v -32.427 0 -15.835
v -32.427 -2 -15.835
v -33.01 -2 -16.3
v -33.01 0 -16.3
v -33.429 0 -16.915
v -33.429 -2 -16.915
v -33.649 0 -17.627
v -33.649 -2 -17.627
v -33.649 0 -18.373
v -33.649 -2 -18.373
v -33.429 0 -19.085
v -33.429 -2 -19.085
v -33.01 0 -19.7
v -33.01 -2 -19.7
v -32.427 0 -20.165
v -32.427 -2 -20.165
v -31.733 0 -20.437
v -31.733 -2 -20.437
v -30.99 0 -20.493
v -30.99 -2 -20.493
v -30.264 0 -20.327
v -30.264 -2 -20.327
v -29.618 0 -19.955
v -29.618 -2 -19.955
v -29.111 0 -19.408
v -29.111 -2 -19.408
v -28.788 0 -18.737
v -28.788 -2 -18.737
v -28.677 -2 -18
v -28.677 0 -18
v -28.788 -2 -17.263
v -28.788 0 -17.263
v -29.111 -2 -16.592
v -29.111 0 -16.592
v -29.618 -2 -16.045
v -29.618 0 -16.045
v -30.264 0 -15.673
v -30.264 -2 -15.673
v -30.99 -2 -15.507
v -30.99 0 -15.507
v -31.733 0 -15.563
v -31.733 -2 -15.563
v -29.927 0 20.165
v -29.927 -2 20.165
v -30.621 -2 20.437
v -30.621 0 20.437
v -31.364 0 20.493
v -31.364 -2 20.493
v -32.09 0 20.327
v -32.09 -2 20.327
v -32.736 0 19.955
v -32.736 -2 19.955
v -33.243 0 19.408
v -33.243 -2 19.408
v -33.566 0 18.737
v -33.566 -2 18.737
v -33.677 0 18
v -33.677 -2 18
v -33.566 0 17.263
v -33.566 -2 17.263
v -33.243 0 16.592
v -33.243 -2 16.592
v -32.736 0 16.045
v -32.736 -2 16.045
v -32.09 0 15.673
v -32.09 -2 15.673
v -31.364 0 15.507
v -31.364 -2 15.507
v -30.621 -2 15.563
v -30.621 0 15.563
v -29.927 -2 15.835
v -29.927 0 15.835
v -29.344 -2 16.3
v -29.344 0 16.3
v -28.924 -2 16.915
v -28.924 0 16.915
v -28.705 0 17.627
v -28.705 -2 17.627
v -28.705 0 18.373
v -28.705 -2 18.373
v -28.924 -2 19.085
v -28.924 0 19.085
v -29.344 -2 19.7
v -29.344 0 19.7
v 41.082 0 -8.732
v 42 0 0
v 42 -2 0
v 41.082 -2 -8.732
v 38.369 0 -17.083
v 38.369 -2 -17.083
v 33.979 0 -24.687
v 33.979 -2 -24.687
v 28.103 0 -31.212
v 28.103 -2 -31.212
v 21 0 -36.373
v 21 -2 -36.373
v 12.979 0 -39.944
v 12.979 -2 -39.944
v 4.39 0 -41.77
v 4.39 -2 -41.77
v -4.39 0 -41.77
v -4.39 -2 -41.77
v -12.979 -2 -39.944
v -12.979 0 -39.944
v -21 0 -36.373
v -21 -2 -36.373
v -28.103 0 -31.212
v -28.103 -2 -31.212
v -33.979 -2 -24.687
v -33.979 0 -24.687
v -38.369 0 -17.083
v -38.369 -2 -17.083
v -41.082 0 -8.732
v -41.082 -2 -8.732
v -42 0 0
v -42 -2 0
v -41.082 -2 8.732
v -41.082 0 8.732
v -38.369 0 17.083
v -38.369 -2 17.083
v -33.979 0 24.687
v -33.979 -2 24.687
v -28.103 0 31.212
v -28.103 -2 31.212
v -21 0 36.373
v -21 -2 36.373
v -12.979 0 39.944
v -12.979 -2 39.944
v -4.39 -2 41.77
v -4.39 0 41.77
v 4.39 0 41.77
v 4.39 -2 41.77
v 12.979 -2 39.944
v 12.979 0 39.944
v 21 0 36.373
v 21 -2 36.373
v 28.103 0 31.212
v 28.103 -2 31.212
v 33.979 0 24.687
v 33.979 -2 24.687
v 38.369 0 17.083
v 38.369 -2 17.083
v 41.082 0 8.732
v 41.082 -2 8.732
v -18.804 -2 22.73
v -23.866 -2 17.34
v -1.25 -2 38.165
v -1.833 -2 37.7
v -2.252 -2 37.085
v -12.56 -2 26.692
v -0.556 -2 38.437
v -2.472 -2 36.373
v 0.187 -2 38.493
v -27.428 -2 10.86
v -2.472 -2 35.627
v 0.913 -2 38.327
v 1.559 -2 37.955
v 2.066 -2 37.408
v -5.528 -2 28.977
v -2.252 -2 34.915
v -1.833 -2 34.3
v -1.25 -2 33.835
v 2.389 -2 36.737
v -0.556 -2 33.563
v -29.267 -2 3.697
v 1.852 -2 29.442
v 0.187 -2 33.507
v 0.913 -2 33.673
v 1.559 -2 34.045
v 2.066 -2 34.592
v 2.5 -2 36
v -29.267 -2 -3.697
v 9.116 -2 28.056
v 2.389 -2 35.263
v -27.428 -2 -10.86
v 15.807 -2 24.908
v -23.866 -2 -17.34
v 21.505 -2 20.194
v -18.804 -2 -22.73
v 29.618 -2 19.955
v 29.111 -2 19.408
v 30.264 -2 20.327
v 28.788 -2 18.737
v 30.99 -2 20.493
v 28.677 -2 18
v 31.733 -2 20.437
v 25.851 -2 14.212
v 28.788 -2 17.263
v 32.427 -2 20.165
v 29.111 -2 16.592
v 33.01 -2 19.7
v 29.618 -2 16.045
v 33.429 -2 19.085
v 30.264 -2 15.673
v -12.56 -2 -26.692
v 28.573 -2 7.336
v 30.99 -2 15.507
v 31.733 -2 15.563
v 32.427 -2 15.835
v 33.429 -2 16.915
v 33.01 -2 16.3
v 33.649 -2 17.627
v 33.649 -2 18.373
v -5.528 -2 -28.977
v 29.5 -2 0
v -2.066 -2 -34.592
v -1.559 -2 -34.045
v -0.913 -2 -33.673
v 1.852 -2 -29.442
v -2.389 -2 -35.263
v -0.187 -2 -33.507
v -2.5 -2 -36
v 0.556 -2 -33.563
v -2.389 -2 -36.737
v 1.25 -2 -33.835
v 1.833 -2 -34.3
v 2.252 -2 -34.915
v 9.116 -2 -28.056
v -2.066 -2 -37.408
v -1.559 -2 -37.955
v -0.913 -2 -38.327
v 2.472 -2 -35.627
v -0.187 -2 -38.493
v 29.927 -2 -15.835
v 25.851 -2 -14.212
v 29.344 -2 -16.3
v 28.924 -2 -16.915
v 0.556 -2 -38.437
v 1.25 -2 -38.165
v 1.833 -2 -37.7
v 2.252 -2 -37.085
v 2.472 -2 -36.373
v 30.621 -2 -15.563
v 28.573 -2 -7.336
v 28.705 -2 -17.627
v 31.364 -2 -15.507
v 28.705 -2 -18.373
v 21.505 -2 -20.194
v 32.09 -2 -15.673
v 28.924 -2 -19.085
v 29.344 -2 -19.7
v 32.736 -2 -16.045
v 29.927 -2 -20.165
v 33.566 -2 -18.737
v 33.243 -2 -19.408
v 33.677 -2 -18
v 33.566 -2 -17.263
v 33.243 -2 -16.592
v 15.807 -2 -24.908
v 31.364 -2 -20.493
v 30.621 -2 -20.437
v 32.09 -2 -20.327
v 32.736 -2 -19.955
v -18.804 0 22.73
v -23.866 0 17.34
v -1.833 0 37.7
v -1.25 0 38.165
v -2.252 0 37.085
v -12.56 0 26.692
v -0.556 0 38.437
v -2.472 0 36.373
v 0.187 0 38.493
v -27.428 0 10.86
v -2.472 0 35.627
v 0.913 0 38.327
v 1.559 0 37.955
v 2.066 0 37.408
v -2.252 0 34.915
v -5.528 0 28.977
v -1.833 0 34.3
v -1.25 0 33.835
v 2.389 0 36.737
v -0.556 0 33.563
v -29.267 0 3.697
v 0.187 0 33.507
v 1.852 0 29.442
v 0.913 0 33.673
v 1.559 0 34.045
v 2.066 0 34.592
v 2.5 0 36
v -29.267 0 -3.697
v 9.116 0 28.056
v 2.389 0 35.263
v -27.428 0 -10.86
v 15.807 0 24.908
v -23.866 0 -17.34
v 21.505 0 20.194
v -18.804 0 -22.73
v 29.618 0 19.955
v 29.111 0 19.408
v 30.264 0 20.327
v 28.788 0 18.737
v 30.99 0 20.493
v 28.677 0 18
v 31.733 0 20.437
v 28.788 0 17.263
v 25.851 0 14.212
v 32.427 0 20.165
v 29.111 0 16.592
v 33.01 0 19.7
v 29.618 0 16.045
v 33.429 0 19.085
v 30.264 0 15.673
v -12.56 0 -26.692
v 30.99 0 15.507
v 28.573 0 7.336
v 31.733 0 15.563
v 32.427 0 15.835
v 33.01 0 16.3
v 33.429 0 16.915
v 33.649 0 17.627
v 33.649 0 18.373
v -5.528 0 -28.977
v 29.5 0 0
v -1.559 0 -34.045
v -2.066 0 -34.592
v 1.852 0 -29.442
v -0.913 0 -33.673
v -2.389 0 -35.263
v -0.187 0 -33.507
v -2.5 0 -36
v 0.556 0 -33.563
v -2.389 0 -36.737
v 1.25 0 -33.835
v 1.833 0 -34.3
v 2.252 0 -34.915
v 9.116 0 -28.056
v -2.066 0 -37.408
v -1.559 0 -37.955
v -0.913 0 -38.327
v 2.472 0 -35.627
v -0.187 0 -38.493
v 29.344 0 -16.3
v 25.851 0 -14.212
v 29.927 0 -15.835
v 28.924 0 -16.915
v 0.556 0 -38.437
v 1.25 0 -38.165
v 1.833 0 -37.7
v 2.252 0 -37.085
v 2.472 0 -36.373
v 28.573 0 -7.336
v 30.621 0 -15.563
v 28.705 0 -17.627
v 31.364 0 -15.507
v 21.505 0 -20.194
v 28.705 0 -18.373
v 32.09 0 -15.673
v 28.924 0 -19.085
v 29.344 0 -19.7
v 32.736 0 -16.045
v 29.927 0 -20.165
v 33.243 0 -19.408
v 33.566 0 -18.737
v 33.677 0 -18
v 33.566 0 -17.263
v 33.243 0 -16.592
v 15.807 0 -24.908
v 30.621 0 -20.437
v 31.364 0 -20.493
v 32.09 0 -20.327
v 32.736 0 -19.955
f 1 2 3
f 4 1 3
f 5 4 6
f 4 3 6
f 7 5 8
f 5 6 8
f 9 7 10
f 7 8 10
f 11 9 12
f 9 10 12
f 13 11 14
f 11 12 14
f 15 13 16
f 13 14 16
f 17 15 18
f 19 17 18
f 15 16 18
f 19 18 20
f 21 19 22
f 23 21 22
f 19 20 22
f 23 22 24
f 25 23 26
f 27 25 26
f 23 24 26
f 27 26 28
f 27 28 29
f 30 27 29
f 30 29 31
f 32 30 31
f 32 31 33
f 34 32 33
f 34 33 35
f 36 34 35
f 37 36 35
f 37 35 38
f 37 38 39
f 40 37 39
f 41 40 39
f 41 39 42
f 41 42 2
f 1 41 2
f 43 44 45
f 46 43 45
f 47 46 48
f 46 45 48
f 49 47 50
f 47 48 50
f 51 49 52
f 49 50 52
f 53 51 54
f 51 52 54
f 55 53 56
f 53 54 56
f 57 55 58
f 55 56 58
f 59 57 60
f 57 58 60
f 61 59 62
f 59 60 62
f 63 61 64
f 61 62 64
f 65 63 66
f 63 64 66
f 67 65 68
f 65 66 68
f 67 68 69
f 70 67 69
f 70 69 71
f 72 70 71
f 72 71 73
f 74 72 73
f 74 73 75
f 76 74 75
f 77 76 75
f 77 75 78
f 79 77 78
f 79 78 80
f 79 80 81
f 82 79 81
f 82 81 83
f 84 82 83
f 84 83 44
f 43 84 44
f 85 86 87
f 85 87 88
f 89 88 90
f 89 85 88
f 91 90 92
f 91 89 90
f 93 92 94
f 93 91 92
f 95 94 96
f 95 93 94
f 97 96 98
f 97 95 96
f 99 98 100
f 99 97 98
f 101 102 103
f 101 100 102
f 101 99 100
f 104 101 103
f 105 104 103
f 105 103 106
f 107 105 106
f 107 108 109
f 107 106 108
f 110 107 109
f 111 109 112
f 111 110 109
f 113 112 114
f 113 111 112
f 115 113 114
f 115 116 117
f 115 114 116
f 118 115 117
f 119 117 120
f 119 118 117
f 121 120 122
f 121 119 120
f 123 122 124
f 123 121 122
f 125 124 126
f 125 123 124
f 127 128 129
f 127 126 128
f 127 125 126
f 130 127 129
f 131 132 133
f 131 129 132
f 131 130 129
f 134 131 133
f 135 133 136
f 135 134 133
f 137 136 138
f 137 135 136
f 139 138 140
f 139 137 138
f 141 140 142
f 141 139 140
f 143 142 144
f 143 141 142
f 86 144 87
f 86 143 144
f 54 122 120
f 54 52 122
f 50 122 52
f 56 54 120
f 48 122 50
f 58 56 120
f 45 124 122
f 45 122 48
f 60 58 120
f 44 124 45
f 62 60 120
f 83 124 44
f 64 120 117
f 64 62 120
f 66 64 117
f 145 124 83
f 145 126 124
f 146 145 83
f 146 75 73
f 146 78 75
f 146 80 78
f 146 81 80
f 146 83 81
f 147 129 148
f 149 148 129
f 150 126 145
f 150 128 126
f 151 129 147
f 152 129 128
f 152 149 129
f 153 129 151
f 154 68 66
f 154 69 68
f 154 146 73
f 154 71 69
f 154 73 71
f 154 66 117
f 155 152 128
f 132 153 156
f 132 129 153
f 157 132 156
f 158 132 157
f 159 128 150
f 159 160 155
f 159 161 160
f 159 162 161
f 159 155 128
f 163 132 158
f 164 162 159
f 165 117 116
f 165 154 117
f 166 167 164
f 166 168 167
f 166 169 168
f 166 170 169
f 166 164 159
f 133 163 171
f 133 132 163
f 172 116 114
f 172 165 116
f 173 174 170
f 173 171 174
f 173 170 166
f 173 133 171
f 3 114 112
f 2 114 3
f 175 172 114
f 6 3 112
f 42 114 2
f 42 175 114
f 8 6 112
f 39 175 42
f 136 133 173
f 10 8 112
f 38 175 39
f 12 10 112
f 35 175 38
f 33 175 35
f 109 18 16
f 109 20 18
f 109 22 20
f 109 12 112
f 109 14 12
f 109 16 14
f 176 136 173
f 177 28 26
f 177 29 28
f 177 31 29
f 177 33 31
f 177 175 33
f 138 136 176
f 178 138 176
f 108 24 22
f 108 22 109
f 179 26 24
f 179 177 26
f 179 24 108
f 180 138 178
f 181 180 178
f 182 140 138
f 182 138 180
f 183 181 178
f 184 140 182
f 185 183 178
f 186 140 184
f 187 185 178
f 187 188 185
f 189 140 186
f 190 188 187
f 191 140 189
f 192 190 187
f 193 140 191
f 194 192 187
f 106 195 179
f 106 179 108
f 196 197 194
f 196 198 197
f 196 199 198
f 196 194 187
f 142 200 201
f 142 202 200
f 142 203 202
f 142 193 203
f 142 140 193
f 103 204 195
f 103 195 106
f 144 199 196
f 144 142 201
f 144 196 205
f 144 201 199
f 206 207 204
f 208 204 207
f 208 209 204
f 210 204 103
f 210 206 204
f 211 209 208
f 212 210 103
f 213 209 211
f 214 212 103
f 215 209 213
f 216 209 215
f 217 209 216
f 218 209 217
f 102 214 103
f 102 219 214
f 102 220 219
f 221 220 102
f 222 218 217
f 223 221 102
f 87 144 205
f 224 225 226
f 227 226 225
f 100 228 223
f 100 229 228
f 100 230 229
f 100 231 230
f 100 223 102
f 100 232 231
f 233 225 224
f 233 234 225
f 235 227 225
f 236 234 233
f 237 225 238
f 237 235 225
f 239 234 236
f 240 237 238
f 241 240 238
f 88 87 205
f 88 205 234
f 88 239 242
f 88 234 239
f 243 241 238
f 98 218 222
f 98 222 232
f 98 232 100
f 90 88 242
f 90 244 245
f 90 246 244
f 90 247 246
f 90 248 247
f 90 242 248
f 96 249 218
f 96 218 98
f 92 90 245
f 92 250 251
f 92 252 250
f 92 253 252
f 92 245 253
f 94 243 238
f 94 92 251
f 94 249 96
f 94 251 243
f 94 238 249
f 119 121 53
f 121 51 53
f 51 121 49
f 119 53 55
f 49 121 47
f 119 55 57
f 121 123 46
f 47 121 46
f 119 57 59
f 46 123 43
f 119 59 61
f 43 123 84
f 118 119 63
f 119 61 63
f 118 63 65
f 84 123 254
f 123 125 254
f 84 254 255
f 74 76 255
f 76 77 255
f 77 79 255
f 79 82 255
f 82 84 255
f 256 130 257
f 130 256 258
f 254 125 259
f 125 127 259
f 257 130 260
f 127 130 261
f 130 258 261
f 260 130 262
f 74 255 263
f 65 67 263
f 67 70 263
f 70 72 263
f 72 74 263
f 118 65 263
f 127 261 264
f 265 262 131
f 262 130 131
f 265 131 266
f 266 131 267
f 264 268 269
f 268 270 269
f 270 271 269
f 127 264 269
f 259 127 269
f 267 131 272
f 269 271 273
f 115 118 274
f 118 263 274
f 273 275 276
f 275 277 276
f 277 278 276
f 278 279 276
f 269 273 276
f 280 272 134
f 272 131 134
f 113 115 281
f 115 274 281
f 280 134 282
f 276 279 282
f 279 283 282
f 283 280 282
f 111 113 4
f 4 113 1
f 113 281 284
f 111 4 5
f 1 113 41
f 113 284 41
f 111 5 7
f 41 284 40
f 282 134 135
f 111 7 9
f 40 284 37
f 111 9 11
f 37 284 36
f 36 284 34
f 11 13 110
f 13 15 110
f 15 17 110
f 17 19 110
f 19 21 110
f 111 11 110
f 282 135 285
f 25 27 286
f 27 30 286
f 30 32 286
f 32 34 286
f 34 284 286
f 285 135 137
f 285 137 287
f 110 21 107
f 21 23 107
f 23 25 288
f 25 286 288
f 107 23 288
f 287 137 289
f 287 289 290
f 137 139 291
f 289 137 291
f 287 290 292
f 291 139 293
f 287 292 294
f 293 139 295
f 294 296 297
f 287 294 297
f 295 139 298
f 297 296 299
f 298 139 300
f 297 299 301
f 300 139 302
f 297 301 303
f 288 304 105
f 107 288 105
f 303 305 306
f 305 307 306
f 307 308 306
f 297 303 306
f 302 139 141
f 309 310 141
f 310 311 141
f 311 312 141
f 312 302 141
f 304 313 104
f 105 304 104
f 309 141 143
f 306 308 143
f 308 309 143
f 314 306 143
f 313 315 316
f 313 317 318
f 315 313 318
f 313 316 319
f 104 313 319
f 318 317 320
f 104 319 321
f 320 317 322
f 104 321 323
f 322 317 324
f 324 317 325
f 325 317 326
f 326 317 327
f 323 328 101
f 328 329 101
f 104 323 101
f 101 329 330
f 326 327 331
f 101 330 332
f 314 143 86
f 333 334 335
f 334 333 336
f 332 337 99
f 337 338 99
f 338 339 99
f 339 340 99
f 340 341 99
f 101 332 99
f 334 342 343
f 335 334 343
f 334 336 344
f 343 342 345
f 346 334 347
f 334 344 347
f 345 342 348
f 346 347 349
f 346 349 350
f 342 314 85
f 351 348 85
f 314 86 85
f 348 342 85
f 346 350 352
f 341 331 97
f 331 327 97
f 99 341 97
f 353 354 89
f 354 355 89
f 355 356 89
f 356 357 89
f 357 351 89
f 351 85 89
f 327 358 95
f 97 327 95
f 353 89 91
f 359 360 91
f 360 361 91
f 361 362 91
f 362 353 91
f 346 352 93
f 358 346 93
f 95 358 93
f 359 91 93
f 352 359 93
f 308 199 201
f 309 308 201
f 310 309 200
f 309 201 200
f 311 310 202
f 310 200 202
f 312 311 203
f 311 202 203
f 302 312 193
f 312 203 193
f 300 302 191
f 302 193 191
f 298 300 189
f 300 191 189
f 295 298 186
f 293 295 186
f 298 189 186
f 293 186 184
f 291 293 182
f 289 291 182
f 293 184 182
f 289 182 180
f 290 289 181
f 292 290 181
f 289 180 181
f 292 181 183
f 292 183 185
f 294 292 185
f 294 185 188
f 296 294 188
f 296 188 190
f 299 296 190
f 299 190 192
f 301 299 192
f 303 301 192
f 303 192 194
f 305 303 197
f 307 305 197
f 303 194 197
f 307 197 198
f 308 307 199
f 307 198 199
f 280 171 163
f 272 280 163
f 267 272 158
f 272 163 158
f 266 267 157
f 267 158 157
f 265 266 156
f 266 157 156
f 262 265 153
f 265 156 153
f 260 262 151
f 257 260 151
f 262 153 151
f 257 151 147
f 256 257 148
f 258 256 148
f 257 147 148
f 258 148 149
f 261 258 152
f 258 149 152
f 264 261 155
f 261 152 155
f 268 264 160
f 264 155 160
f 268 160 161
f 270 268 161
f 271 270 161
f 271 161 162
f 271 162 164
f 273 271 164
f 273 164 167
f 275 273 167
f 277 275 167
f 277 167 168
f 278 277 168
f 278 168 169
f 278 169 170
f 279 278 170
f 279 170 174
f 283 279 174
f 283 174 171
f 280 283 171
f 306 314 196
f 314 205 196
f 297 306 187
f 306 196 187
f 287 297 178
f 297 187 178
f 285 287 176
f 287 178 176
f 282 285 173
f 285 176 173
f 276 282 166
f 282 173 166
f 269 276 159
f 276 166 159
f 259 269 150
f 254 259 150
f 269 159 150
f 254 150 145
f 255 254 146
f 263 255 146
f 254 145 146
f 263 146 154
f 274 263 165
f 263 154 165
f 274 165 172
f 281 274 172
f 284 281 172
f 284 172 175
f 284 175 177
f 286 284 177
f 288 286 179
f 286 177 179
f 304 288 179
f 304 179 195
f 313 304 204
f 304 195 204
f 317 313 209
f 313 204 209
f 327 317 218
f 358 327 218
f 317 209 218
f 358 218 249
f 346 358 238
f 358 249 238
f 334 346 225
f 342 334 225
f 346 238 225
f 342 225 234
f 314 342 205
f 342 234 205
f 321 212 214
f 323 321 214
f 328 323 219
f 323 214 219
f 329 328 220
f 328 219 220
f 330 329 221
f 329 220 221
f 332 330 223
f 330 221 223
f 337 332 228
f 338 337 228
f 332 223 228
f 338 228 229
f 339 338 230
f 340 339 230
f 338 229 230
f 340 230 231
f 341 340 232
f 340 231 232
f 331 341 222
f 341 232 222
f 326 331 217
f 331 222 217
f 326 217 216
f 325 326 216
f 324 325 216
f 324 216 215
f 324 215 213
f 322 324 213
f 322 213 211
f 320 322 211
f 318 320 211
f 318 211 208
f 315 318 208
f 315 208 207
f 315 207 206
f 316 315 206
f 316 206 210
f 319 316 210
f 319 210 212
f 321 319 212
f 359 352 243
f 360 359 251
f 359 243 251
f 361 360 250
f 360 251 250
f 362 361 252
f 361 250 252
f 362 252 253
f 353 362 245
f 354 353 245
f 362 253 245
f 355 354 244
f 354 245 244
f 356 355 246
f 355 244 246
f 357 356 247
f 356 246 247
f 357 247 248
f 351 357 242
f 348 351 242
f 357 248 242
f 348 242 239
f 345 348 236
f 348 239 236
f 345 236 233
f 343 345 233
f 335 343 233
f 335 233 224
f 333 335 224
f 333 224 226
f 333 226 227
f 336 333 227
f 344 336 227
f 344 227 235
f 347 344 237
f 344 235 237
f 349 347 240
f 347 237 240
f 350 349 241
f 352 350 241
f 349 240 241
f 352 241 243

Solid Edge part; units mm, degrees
sketch "Sketch1" plane through (0, 0, 0) normal (0, -1, 0) x (1, 0, 0)
  circle A0 centre (0, 0) radius 42
  dimension "D1" = 84
extrude "Protrusion1" add sketch "Sketch1" along normal blind 2
sketch "Sketch2" plane through (0, -2, 0) normal (0, -1, 0) x (1, 0, 0)
  circle A0 centre (0, 0) radius 29.5
  dimension "D1" = 59
extrude "Cutout1" cut sketch "Sketch2" against normal through all
sketch "Sketch3" plane through (0, -2, 0) normal (0, -1, 0) x (1, 0, 0)
  circle A0 centre (0, 36) radius 2.5
  dimension "D1" = 5
  dimension "D2" = 36
extrude "Cutout2" cut sketch "Sketch3" against normal through all
pattern_circular "Pattern1" count 6 over 360 about axis through (0, -2, 0) along (0, 1, 0) of "Cutout2"
properties material "Aluminum, 1060"
